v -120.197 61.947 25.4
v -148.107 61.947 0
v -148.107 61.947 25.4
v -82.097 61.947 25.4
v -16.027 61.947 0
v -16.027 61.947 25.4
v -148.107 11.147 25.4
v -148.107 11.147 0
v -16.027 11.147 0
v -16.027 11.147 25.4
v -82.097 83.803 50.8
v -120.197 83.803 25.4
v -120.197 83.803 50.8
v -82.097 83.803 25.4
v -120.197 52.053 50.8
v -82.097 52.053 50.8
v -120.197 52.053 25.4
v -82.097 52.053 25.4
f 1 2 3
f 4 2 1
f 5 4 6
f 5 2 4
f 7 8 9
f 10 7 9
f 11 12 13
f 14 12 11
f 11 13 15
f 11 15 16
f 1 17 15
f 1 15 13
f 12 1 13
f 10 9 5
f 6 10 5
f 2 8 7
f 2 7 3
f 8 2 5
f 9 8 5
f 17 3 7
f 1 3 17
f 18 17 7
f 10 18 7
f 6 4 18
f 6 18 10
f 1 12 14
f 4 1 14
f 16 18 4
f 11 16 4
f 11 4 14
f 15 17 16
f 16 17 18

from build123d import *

# Parameters (mm, degrees)
F0_W     = 132.08
F0_H     = 50.8
F1_DEPTH = 25.4
F2_W     = 38.1
F2_H     = 31.75
F3_DEPTH = 25.4
F4_DEPTH = 25.4


with BuildPart() as f1:
    # F0 (on Top) → F1 (new body)
    with BuildSketch(Plane.XY):
        with Locations((-82.06671, 36.546972)):
            Rectangle(F0_W, F0_H)
    extrude(amount=F1_DEPTH)

    # F2 (on face) → F3 (join)
    with BuildSketch(Plane.XY.offset(25.4)):
        with Locations((-101.147438, 67.928043)):
            Rectangle(F2_W, F2_H)
    extrude(amount=F3_DEPTH)

    # F2 (on face) → F4 (join)
    with BuildSketch(Plane.XY.offset(25.4)):
        with Locations((-101.147438, 67.928043)):
            Rectangle(F2_W, F2_H)
    extrude(amount=F4_DEPTH)


solid = f1.part
